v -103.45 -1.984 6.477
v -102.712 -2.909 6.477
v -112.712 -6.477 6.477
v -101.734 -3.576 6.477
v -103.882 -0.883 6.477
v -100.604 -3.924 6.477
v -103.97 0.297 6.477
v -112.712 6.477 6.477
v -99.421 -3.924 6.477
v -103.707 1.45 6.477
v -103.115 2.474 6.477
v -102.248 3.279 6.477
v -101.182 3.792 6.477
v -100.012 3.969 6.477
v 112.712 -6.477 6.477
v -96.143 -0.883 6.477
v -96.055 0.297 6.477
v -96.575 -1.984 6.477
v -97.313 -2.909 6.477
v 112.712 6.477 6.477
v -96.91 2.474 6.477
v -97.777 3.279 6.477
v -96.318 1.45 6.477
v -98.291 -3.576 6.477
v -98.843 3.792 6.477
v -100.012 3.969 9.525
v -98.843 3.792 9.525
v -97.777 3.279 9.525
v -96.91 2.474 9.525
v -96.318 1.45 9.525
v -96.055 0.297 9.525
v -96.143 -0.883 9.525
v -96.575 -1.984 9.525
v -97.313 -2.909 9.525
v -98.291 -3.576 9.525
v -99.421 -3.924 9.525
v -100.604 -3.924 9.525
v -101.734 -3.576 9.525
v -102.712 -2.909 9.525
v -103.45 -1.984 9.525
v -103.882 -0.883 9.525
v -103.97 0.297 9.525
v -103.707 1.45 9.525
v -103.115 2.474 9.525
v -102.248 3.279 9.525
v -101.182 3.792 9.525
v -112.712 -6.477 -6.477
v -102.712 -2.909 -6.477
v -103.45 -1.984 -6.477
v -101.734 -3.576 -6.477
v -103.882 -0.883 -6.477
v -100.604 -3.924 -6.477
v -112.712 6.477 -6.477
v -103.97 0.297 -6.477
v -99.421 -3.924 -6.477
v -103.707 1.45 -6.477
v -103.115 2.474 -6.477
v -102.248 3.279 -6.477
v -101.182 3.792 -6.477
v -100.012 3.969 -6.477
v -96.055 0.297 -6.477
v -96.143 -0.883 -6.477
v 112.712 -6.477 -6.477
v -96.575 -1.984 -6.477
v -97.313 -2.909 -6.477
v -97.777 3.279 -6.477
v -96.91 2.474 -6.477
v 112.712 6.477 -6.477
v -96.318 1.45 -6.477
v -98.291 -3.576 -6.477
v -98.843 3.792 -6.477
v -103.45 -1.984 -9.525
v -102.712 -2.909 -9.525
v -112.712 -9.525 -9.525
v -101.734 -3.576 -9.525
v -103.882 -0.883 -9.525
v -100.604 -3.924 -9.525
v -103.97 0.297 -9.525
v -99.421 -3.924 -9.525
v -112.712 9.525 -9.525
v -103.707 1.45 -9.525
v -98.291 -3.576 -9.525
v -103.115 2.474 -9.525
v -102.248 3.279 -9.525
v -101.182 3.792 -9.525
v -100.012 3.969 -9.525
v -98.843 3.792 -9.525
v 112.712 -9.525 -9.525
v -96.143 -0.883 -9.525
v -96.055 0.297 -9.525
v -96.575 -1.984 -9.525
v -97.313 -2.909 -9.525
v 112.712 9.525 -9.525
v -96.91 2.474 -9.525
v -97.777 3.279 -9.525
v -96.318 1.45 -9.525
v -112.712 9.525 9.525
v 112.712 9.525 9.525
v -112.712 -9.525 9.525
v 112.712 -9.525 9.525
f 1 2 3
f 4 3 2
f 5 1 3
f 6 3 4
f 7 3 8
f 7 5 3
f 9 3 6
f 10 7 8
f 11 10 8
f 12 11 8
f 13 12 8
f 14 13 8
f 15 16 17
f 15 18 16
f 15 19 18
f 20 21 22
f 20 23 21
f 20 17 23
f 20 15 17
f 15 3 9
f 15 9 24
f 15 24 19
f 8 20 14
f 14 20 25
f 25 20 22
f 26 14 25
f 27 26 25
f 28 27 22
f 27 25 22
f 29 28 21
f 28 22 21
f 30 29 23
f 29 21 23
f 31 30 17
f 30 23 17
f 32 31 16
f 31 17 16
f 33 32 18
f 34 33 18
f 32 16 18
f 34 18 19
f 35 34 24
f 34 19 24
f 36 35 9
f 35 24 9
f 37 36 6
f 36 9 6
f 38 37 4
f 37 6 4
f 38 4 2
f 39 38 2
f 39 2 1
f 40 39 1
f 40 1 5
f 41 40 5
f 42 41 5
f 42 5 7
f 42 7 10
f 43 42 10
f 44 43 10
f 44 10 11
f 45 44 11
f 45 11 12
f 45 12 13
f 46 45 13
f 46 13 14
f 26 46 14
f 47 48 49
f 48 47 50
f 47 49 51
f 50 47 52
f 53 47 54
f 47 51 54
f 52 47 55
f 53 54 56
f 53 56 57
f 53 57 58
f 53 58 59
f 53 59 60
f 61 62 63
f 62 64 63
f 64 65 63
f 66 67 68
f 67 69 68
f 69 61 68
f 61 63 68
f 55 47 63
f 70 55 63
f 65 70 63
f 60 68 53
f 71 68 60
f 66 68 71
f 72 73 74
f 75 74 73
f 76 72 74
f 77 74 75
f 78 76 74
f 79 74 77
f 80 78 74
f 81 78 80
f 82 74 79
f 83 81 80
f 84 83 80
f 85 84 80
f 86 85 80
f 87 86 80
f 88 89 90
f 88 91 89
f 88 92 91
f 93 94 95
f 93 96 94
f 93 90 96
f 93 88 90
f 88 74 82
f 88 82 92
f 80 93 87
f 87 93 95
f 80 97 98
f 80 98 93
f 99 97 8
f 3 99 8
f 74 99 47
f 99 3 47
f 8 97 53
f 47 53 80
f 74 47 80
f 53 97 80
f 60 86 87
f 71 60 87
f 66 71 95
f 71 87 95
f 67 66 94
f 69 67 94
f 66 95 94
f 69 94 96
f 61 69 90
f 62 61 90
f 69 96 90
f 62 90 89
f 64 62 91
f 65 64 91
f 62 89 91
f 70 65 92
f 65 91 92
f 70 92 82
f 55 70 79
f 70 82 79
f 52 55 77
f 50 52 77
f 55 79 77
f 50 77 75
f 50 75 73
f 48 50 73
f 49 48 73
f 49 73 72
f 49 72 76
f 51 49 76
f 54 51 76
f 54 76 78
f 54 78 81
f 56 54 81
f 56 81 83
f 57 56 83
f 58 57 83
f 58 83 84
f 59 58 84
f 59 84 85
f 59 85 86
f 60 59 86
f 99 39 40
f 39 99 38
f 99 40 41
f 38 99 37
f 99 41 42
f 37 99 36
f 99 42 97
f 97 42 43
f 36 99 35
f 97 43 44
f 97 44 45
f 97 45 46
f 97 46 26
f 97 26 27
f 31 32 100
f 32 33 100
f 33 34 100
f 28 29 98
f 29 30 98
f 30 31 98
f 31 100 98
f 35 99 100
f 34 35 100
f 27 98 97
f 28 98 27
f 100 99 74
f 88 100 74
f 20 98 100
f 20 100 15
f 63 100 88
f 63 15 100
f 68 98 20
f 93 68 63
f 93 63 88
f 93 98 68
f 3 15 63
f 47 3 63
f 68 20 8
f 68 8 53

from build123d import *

# Parameters (mm, degrees)
SKETCH1_W           = 19.05
SKETCH1_H           = 19.05
BOSS_EXTRUDE1_DEPTH = 112.7125
SHELL1_T            = -3.048
CUT_EXTRUDE2_REACH  = 116.707
SKETCH8_R           = 3.96875


with BuildPart() as part:
    # Sketch1 → Boss-Extrude1 (new, symmetric)
    with BuildSketch(Plane(origin=(0, 0, 0), x_dir=(0, 0, -1), z_dir=(1, 0, 0))):
        Rectangle(SKETCH1_W, SKETCH1_H)
    extrude(amount=BOSS_EXTRUDE1_DEPTH, both=True)

    # Shell1
    shell1_openings = [part.faces().sort_by_distance(p)[0] for p in [
        (112.7125, 0, 0),
        (-112.7125, 0, 0),
    ]]
    offset(amount=SHELL1_T, openings=shell1_openings, kind=Kind.INTERSECTION)

    # Cut-Extrude2: up to this face of the body (flat: up to its plane)
    cut_extrude2_end = Plane(part.part.faces().sort_by_distance((0, 0, 9.525))[0])
    # Sketch8 → Cut-Extrude2 (cut, up to the picked face)
    with BuildSketch(Plane(origin=(0, 0, -9.525), x_dir=(-1, 0, 0), z_dir=(0, 0, -1)), mode=Mode.PRIVATE) as cut_extrude2_sk1:
        with Locations(Location((100.0125, 0, 0), (0, 0, 90))):
            Circle(SKETCH8_R)
    cut_extrude2_tool1 = split(extrude(cut_extrude2_sk1.sketch, amount=-CUT_EXTRUDE2_REACH, mode=Mode.PRIVATE), bisect_by=cut_extrude2_end, keep=Keep.BOTH, mode=Mode.PRIVATE)
    add(cut_extrude2_tool1.solids().sort_by(Axis((-100.0125, 0, -9.525), (0, 0, 1)))[0], mode=Mode.SUBTRACT)


solid = part.part
